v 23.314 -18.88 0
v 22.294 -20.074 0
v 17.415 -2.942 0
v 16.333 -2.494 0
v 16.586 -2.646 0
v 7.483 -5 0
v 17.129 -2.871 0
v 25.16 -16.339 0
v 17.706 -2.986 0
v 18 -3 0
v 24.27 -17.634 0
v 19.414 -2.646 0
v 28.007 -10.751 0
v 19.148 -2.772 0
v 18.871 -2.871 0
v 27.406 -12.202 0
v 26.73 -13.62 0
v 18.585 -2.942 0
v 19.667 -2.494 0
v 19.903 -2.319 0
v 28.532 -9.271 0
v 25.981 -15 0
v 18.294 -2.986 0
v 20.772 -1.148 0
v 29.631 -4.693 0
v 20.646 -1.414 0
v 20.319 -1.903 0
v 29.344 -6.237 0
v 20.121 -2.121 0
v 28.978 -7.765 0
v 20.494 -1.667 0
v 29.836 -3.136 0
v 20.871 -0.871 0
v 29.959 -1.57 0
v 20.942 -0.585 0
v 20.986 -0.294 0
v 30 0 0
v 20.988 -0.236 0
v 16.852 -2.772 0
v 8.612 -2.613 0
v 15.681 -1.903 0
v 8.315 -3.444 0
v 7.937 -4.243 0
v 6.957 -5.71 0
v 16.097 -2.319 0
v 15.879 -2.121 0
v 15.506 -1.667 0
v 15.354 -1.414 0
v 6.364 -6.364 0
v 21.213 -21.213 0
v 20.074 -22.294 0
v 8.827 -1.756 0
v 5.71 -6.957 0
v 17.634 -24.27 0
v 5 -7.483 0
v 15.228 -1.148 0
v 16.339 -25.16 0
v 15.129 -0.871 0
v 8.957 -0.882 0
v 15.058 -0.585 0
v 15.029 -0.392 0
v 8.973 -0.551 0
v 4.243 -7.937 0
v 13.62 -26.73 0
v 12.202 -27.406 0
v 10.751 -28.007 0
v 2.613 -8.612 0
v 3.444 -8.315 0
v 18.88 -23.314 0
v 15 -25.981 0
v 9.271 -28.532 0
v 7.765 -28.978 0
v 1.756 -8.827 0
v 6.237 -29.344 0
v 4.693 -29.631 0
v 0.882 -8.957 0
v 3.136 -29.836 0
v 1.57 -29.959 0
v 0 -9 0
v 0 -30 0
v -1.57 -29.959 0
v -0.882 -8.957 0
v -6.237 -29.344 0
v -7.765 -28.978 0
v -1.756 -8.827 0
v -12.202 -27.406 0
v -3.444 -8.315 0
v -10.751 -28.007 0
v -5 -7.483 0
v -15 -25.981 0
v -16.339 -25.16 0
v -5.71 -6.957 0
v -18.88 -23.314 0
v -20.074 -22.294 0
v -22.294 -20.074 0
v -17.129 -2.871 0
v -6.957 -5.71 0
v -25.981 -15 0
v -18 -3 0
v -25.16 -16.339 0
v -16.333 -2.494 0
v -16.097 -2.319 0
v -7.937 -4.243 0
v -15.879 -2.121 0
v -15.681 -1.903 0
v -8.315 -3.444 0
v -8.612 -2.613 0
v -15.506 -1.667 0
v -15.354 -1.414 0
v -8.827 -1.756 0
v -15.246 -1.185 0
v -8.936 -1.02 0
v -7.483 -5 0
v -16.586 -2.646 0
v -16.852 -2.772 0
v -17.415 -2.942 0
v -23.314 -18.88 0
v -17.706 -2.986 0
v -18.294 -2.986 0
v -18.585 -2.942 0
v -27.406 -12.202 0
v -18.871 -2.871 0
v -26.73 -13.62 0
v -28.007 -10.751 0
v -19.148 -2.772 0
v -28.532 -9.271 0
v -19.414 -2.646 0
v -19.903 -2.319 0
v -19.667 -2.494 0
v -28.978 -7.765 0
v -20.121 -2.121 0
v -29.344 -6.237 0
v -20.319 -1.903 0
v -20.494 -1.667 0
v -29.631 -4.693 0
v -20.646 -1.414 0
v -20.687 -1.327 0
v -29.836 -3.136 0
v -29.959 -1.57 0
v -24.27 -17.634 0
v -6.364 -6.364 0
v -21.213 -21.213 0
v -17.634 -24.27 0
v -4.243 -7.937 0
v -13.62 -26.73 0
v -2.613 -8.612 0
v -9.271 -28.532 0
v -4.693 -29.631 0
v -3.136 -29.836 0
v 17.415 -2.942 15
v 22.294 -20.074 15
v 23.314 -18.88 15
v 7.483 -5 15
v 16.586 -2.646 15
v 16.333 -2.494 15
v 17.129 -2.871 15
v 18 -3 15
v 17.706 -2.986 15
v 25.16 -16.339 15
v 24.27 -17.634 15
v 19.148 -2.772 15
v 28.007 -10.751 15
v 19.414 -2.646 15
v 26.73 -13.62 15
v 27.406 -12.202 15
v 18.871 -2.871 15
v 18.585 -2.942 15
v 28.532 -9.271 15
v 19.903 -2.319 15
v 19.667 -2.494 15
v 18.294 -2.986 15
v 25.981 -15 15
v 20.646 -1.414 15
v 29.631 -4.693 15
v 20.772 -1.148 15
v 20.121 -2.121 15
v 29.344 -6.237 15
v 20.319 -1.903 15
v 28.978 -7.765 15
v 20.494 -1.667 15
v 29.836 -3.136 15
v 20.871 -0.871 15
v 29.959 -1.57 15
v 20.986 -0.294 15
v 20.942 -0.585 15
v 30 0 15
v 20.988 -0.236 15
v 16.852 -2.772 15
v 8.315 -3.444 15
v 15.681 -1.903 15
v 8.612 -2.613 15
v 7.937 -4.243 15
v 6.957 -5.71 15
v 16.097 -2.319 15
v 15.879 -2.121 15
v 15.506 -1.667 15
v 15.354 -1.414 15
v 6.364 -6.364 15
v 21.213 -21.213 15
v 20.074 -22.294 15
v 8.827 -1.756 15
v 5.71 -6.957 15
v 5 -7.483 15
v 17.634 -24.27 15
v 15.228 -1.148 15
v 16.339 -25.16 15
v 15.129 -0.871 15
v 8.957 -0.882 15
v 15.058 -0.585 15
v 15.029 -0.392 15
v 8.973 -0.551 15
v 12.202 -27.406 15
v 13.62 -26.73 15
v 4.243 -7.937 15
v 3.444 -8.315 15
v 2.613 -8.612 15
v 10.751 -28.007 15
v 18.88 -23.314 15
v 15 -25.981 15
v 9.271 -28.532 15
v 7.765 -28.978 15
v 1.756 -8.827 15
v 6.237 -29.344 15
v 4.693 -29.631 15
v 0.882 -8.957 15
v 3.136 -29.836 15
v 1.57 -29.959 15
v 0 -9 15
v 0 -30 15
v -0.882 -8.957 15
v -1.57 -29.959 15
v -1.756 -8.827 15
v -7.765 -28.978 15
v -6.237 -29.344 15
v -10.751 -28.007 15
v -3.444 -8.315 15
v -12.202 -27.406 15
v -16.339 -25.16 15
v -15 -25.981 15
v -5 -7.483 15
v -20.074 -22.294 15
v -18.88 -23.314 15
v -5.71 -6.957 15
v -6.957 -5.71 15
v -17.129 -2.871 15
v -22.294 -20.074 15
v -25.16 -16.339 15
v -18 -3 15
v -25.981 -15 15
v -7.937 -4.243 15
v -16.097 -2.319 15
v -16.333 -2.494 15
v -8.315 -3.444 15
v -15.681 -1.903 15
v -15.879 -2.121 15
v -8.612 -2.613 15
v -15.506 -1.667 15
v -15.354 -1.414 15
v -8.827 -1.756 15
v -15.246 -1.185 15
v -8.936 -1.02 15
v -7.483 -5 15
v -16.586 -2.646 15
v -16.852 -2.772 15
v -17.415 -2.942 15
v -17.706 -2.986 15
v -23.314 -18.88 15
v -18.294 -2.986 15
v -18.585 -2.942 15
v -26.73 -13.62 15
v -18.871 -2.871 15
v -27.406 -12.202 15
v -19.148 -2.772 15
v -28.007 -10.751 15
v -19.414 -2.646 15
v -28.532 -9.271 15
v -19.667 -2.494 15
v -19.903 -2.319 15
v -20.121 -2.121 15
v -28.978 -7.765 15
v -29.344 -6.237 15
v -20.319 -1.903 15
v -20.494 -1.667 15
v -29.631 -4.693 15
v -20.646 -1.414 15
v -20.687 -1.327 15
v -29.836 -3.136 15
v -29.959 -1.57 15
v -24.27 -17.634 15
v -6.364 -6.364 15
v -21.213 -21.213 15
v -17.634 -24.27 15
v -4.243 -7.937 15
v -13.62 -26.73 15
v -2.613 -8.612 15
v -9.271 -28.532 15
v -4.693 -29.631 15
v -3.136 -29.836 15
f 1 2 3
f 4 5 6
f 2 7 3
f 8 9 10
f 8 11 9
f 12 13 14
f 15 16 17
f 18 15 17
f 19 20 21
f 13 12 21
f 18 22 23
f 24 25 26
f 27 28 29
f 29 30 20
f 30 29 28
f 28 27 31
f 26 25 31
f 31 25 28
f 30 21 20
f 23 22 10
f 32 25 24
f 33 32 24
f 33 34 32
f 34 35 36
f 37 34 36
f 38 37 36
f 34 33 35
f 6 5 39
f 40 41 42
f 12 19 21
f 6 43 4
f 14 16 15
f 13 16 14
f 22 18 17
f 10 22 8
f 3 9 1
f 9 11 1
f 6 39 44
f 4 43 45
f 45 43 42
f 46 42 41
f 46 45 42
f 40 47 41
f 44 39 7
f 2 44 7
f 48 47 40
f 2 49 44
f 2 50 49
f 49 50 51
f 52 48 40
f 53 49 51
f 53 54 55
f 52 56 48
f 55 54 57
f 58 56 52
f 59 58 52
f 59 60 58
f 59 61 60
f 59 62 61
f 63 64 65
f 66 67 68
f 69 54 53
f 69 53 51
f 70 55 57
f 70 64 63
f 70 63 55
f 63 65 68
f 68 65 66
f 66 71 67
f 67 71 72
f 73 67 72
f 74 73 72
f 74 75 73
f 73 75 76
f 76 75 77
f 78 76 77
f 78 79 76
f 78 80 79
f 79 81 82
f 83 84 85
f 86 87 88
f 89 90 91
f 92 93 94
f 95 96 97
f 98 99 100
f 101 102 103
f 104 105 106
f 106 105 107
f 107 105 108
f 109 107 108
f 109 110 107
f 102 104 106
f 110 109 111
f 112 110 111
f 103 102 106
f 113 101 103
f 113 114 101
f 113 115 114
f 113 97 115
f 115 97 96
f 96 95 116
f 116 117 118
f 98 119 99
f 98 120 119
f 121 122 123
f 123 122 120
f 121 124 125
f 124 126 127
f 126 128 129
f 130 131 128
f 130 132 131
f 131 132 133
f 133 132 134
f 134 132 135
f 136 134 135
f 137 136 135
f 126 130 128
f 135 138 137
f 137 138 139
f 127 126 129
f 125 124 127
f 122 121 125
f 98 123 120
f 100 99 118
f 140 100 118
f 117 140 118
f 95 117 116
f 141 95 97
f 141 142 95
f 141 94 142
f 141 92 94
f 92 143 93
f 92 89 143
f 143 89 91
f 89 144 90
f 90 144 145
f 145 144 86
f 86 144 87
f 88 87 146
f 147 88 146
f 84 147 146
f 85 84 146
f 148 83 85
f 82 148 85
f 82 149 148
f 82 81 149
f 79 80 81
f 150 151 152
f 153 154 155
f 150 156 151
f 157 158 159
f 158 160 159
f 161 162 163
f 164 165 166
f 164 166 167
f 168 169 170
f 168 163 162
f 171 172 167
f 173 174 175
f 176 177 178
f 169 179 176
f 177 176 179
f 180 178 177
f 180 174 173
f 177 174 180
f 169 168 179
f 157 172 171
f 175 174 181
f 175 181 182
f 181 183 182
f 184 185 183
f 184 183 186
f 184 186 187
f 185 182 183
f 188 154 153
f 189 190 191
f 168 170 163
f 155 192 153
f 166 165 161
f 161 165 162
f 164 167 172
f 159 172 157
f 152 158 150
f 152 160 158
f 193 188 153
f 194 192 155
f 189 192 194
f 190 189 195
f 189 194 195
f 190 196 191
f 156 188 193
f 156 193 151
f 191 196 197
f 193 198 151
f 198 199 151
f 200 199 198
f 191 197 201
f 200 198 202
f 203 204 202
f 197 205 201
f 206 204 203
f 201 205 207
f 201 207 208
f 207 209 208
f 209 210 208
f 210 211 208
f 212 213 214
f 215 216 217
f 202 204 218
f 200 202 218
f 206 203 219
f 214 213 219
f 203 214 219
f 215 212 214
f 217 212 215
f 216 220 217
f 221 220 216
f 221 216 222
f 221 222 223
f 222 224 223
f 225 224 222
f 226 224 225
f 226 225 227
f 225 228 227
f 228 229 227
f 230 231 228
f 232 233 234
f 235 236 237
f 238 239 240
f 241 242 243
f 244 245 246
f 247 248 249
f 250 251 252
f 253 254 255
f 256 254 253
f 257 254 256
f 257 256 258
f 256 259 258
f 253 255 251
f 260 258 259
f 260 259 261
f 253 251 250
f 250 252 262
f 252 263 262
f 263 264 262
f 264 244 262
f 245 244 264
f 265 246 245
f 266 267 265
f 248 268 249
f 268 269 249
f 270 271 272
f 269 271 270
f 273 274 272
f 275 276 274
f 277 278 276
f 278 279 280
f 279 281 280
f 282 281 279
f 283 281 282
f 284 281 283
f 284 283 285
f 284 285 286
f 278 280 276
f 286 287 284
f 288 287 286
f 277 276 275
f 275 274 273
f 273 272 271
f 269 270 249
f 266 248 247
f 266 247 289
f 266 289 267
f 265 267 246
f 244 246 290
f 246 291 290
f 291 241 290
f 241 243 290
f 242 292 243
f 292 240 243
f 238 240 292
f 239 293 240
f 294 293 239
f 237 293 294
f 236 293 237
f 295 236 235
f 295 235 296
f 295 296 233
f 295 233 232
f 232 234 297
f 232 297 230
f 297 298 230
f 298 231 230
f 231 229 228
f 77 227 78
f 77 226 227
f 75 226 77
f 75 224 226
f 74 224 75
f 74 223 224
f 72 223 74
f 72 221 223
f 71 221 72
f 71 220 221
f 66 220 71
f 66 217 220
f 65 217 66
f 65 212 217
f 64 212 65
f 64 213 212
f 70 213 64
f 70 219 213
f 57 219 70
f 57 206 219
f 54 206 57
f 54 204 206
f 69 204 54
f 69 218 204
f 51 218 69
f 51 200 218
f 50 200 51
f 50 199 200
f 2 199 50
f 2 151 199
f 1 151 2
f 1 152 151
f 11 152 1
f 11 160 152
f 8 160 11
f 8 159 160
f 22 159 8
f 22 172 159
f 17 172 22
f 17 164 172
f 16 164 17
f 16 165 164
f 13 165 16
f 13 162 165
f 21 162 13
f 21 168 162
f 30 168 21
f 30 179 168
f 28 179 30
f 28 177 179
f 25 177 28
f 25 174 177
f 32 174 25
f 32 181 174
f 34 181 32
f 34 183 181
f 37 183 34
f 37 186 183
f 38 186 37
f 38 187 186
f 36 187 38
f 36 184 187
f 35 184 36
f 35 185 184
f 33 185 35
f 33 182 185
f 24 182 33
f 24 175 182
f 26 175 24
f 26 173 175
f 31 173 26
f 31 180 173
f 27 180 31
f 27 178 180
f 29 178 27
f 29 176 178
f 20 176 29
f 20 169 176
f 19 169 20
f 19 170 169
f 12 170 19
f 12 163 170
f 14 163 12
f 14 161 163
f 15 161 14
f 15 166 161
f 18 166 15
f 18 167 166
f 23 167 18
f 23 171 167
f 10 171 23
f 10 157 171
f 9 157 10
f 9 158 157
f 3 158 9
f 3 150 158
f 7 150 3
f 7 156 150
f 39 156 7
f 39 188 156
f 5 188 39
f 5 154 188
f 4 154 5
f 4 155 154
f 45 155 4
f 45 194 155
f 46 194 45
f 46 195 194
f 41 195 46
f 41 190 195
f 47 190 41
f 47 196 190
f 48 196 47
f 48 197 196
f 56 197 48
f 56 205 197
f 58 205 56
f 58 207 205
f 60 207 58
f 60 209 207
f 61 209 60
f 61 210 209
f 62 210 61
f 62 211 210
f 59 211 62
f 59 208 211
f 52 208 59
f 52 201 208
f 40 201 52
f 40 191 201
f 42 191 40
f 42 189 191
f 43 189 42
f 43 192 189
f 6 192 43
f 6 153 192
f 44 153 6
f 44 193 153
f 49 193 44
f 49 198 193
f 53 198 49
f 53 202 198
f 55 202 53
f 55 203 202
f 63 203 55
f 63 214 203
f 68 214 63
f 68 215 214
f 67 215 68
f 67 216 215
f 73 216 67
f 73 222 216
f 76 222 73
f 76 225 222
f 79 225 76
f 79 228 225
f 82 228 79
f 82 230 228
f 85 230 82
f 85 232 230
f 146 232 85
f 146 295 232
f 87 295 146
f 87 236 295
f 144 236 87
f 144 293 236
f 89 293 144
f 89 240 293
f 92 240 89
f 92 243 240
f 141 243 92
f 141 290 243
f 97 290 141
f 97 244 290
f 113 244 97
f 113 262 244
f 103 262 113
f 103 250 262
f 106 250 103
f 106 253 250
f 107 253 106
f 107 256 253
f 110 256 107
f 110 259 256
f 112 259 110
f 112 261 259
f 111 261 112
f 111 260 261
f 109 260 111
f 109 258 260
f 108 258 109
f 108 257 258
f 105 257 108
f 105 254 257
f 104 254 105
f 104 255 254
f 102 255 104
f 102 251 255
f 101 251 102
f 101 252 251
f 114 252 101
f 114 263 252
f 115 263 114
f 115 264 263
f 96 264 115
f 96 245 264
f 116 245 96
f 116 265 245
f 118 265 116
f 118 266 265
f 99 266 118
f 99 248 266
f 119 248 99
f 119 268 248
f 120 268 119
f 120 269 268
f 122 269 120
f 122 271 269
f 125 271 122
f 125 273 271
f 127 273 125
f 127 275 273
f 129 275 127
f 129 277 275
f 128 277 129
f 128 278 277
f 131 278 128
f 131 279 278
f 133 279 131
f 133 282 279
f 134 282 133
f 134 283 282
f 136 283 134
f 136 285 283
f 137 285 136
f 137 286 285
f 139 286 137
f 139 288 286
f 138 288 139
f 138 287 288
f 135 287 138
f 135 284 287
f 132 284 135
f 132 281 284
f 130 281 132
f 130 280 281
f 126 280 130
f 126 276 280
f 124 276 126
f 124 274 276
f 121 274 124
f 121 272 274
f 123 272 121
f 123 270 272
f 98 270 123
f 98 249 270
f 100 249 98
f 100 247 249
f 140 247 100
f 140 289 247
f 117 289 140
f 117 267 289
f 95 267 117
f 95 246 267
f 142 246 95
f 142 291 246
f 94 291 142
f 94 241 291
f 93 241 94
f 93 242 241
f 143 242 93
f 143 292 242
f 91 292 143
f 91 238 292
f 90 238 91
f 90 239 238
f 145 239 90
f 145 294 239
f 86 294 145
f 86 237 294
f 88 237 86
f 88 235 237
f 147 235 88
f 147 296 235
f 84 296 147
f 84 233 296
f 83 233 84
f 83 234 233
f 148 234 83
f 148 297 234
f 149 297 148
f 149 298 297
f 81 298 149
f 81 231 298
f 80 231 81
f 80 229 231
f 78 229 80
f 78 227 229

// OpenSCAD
linear_extrude(height = 15)
  difference() {
    polygon(points = [[30,0],[29.961,1.57],[29.852,3.138],[29.684,4.701],[29.468,6.263],[29.212,7.827],[28.925,9.398],[28.609,10.982],[28.267,12.585],[27.897,14.214],[27.496,15.875],[27.057,17.571],[26.571,19.305],[26.026,21.076],[25.411,22.881],[24.713,24.713],[23.919,26.564],[23.015,28.421],[21.991,30.268],[20.837,32.086],[19.547,33.856],[18.116,35.554],[16.544,37.157],[14.833,38.642],[12.992,39.986],[11.03,41.165],[8.961,42.16],[6.803,42.954],[4.575,43.531],[2.3,43.882],[0,44],[2.3,43.882],[4.575,43.531],[6.803,42.954],[8.961,42.16],[11.03,41.165],[12.992,39.986],[14.833,38.642],[16.544,37.157],[18.116,35.554],[19.547,33.856],[20.837,32.086],[21.991,30.268],[23.015,28.421],[23.919,26.564],[24.713,24.713],[25.411,22.881],[26.026,21.076],[26.571,19.305],[27.057,17.571],[27.496,15.875],[27.897,14.214],[28.267,12.585],[28.609,10.982],[28.925,9.398],[29.212,7.827],[29.468,6.263],[29.684,4.701],[29.852,3.138],[29.961,1.57],[30,0],[-29.959,-1.57],[-29.836,-3.136],[-29.631,-4.693],[-29.344,-6.237],[-28.978,-7.765],[-28.532,-9.271],[-28.007,-10.751],[-27.406,-12.202],[-26.73,-13.62],[-25.981,-15],[-25.16,-16.339],[-24.27,-17.634],[-23.314,-18.88],[-22.294,-20.074],[-21.213,-21.213],[-20.074,-22.294],[-18.88,-23.314],[-17.634,-24.27],[-16.339,-25.16],[-15,-25.981],[-13.62,-26.73],[-12.202,-27.406],[-10.751,-28.007],[-9.271,-28.532],[-7.765,-28.978],[-6.237,-29.344],[-4.693,-29.631],[-3.136,-29.836],[-1.57,-29.959],[0,-30],[1.57,-29.959],[3.136,-29.836],[4.693,-29.631],[6.237,-29.344],[7.765,-28.978],[9.271,-28.532],[10.751,-28.007],[12.202,-27.406],[13.62,-26.73],[15,-25.981],[16.339,-25.16],[17.634,-24.27],[18.88,-23.314],[20.074,-22.294],[21.213,-21.213],[22.294,-20.074],[23.314,-18.88],[24.27,-17.634],[25.16,-16.339],[25.981,-15],[26.73,-13.62],[27.406,-12.202],[28.007,-10.751],[28.532,-9.271],[28.978,-7.765],[29.344,-6.237],[29.631,-4.693],[29.836,-3.136],[29.959,-1.57]]);
    translate([-18,0]) circle(r = 3, $fn = 64);
    translate([18,0]) circle(r = 3, $fn = 64);
    translate([0,0]) circle(r = 9, $fn = 64);
  }
